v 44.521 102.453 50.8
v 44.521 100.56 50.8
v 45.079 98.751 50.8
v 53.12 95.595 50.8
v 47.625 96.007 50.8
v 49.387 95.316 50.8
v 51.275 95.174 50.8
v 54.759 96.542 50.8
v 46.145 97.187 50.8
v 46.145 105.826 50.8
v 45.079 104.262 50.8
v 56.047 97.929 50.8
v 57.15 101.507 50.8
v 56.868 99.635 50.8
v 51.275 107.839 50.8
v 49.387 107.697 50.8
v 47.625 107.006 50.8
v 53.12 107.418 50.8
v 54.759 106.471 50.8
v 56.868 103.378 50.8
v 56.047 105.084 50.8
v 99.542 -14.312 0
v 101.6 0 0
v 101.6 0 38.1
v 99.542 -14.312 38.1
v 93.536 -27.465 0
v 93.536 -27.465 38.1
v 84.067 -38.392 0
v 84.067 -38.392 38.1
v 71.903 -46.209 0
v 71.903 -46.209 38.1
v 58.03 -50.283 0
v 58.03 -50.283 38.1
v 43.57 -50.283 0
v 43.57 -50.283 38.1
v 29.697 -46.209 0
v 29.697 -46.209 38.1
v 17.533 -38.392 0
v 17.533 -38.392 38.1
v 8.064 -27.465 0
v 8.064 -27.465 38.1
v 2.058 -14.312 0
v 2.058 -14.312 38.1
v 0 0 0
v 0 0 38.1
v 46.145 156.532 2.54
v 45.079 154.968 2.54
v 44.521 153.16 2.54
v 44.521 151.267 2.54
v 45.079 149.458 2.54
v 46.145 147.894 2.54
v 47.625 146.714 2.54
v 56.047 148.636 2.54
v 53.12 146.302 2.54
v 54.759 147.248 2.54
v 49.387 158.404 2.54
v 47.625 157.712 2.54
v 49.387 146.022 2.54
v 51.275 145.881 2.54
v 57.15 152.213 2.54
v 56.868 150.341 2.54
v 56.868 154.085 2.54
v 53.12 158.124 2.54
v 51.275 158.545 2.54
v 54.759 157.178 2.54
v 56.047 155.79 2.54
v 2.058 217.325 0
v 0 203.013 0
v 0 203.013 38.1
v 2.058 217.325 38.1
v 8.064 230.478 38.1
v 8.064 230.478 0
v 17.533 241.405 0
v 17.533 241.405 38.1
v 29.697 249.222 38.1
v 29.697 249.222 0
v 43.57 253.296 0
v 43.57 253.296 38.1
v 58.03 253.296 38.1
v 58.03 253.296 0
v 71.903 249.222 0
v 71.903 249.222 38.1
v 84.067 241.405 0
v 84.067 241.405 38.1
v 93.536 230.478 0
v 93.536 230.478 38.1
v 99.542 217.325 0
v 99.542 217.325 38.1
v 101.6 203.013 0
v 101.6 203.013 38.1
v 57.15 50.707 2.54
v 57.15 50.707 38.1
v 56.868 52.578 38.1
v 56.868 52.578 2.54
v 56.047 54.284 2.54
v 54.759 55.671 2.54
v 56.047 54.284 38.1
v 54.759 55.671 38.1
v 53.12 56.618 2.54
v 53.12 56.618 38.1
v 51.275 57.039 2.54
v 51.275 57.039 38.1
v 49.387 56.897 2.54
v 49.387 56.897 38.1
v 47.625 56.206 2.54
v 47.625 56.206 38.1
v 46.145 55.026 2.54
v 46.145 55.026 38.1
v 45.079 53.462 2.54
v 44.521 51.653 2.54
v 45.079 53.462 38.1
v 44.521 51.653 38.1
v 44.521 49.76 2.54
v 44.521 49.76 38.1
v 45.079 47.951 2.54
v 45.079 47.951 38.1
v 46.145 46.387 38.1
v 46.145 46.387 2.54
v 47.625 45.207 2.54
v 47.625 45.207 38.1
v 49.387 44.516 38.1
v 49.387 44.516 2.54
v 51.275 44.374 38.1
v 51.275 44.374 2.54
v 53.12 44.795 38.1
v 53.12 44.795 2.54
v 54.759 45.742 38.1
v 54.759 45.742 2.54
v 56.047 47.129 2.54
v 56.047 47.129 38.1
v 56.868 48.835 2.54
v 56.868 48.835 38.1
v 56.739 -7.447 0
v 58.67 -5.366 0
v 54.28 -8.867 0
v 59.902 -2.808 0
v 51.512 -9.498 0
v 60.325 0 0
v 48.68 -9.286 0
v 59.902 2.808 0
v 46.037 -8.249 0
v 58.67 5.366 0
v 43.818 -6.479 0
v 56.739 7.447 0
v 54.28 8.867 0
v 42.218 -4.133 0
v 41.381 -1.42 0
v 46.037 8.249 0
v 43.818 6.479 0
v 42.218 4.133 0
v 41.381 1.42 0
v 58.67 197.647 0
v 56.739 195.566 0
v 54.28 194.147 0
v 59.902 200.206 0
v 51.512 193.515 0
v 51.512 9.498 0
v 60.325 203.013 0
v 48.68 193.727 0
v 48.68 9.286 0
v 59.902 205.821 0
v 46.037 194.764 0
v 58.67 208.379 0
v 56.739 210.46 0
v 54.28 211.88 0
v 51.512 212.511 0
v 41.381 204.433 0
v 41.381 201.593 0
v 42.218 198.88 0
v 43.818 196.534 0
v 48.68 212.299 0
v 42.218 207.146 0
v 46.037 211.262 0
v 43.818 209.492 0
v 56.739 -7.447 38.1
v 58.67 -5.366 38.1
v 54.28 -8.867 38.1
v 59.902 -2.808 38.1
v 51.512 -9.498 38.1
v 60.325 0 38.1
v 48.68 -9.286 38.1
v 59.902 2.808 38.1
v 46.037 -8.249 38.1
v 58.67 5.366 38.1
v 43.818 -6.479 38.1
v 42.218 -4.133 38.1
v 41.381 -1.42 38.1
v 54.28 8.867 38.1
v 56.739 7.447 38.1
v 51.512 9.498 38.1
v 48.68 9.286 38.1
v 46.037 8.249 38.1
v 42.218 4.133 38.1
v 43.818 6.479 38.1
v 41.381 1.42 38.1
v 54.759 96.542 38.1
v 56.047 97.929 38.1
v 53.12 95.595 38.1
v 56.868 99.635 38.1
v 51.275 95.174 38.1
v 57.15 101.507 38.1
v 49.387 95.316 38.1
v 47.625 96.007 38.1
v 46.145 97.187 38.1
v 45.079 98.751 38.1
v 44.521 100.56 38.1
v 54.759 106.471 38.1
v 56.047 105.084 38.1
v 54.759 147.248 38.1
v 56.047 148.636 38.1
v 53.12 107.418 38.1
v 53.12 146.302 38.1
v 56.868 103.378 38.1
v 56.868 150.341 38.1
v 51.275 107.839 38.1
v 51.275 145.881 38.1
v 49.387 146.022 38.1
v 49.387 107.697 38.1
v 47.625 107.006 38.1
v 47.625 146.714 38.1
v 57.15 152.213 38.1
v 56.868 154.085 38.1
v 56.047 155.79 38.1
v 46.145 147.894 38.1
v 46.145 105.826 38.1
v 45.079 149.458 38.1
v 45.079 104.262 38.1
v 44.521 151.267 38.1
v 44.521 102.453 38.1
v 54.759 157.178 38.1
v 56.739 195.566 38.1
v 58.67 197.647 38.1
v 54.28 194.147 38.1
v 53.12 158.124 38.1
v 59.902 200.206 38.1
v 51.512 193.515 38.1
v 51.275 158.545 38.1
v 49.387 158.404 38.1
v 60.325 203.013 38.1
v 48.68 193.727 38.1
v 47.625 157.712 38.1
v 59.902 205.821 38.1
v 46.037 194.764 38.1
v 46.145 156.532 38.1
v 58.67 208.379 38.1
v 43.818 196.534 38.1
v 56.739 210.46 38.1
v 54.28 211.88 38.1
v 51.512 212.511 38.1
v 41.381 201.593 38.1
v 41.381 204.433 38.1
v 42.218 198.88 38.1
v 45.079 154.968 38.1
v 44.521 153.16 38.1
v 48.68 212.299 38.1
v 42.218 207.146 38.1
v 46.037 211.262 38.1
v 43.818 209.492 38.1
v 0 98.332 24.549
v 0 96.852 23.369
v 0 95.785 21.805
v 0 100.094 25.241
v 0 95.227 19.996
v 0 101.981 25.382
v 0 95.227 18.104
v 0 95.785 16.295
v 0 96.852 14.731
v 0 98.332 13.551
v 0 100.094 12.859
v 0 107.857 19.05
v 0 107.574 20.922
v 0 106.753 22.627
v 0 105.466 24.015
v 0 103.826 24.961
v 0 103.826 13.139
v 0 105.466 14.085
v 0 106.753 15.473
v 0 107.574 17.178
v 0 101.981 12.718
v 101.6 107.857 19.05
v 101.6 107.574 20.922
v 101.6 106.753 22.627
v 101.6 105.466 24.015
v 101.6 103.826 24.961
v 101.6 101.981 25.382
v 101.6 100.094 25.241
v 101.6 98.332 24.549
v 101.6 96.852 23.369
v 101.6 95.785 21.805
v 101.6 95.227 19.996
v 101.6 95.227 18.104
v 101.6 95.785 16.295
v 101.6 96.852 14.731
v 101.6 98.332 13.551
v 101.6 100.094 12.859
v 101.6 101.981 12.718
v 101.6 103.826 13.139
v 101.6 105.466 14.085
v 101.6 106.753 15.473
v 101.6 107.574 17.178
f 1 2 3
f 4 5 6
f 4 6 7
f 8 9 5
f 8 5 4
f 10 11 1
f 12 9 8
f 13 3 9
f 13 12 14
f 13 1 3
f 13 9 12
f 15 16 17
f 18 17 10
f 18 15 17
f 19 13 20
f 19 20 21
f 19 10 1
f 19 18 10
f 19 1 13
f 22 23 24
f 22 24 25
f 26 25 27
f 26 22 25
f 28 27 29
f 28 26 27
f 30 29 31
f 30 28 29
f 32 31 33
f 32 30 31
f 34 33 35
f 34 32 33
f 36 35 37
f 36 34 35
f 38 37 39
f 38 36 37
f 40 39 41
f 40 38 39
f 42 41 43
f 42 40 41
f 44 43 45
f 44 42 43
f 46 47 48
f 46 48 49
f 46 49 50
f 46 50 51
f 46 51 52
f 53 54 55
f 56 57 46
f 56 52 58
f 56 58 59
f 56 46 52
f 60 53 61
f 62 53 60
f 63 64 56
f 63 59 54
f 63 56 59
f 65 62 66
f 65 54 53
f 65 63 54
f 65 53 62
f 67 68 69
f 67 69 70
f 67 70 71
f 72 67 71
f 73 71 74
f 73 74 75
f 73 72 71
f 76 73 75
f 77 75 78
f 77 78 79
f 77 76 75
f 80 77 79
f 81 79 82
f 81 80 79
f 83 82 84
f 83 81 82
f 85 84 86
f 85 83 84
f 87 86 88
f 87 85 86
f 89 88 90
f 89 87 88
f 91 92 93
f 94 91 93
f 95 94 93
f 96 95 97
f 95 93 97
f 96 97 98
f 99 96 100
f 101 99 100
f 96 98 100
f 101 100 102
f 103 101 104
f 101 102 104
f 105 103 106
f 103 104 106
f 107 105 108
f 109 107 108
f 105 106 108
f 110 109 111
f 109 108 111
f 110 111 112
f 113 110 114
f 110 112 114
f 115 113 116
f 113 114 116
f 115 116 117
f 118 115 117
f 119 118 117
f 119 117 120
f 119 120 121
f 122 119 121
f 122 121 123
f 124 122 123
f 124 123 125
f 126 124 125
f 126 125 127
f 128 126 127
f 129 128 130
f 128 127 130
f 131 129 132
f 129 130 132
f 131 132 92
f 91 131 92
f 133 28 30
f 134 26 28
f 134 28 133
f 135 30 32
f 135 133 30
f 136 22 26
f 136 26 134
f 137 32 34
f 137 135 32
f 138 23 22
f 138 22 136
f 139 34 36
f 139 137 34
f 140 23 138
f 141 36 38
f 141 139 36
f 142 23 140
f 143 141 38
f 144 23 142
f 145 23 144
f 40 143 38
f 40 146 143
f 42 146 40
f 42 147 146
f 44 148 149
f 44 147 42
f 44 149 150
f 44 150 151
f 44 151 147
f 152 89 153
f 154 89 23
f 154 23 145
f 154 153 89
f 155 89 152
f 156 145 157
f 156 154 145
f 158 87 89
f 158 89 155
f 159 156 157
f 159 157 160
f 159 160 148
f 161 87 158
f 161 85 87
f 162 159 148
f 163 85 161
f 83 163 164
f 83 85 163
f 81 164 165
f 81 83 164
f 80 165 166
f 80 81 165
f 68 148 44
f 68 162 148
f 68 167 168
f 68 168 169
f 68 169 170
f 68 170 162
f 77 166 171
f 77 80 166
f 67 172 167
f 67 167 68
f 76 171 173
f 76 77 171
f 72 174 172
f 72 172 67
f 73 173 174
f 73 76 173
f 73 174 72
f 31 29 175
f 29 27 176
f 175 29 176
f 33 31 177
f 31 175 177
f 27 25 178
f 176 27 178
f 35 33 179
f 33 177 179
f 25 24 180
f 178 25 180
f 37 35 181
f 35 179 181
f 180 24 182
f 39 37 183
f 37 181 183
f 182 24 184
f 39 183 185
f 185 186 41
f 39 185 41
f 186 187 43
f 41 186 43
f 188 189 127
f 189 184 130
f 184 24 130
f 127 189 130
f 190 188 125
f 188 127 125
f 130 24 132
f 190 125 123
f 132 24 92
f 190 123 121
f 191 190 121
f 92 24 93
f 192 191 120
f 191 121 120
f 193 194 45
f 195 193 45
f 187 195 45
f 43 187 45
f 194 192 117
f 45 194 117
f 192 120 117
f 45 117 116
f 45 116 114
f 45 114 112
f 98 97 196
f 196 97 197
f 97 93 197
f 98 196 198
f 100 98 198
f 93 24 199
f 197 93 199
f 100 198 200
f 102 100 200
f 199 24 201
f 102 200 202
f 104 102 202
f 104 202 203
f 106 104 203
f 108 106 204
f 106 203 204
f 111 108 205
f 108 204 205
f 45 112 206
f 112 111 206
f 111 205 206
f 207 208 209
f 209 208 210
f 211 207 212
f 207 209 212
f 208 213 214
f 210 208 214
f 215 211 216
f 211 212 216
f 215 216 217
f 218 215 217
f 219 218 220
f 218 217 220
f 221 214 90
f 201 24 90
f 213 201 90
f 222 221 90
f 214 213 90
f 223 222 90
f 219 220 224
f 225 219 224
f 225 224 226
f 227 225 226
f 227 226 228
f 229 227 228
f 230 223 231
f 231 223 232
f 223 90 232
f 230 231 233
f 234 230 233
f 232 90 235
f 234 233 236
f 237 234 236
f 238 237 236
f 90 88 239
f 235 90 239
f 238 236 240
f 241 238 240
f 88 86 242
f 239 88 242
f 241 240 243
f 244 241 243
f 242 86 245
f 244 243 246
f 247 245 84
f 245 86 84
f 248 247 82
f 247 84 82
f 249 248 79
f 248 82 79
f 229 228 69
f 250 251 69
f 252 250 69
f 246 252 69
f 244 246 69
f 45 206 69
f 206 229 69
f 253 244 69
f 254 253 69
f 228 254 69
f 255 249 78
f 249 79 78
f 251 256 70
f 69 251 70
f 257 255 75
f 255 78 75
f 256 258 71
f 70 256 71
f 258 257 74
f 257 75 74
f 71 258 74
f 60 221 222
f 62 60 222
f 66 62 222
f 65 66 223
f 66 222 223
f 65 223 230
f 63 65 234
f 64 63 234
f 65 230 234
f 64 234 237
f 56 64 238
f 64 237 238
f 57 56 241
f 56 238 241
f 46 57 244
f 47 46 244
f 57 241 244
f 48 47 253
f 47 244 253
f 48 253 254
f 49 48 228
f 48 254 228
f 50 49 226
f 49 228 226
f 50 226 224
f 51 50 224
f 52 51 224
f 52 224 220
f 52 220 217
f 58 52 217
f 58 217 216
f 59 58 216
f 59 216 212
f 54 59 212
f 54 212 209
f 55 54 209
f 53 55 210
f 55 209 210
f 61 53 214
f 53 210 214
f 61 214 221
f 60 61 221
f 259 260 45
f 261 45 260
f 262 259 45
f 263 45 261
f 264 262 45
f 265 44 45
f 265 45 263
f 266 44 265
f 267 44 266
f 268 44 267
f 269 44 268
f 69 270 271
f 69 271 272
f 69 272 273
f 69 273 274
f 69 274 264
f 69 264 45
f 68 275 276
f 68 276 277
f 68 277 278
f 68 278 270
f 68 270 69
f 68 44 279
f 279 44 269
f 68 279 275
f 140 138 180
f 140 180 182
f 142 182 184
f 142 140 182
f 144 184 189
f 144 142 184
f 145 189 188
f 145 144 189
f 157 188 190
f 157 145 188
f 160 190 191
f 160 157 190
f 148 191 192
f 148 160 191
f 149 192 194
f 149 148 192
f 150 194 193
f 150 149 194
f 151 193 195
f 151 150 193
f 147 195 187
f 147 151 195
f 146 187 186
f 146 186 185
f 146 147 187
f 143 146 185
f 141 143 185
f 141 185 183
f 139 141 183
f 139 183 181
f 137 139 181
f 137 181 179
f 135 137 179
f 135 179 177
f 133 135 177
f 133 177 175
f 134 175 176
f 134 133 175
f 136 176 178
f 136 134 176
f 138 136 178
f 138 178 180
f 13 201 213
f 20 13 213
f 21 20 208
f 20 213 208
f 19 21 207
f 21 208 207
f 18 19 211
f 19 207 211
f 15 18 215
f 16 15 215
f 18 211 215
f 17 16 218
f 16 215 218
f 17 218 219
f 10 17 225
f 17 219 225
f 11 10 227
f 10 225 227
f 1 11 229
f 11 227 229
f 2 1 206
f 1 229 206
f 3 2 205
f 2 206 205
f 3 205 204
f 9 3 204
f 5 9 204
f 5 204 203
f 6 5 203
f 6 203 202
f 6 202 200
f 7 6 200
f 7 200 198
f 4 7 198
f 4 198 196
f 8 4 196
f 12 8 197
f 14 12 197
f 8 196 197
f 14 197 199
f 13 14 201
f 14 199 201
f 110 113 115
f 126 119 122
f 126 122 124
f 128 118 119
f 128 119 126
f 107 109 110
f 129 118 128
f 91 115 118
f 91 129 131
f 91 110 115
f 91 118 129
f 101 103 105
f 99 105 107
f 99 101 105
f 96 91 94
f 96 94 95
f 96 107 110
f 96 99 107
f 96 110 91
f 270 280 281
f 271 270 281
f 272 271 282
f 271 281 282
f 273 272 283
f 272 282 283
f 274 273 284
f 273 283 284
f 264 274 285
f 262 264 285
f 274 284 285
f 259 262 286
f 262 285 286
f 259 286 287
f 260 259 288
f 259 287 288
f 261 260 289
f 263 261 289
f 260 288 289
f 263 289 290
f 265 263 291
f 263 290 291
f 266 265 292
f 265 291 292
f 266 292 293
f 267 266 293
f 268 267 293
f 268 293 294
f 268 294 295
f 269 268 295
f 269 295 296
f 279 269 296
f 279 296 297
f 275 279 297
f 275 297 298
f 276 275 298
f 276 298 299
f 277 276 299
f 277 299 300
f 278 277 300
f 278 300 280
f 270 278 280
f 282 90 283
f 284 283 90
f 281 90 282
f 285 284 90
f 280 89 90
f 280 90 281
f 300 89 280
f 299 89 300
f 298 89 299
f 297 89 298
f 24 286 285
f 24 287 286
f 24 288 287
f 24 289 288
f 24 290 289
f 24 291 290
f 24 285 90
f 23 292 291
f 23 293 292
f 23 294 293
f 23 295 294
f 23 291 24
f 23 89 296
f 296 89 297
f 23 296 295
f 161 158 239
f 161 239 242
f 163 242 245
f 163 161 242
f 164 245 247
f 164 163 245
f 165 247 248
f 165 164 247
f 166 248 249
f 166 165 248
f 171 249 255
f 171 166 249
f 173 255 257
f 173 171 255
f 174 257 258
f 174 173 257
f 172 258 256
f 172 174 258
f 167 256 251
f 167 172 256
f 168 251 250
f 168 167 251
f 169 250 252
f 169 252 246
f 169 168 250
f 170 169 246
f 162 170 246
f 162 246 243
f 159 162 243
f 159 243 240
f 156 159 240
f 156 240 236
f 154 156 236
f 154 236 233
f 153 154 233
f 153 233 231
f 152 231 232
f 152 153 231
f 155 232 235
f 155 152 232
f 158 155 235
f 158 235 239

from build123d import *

# Parameters (mm, degrees)
BOSS_EXTRUDE1_DEPTH     = 38.1
SKETCH2_R               = 6.35
CUT_EXTRUDE1_DEPTH      = 277.034883433
ADVANCEDHOLE3_OUTLINE_R = 9.525
ADVANCEDHOLE3_DEPTH     = 38.1
SKETCH21_R              = 6.35
CUT_EXTRUDE2_DEPTH      = 35.56
SKETCH23_R              = 6.35
BOSS_EXTRUDE2_DEPTH     = 12.7


# Read off the part's stored shape, not the designer's step: AdvancedHole3
with BuildPart() as part:
    # Sketch1 → Boss-Extrude1 (new body)
    with BuildSketch(Plane.XY):
        with BuildLine():
            Line((0, 0), (0, 203.013094366))
            ThreePointArc((0, 203.013094366), (50.8, 253.813094366), (101.6, 203.013094366))
            Line((101.6, 203.013094366), (101.6, 0))
            ThreePointArc((101.6, 0), (50.8, -50.8), (0, 0))
        make_face()
    extrude(amount=BOSS_EXTRUDE1_DEPTH)

    # Sketch2 → Cut-Extrude1 (cut, through all)
    with BuildSketch(Plane(origin=(101.6, 0, 0), x_dir=(0, 0, -1), z_dir=(1, 0, 0))):
        with Locations(Location((-19.05, 101.506547183, 0), (0, 0, 90))):
            Circle(SKETCH2_R)
    extrude(amount=-CUT_EXTRUDE1_DEPTH, mode=Mode.SUBTRACT)

    # AdvancedHole3 outline → AdvancedHole3 (cut)
    with BuildSketch(Plane.XY):
        with Locations((50.8, 203.013094366)):
            Circle(ADVANCEDHOLE3_OUTLINE_R)
        with Locations((50.8, 0)):
            Circle(ADVANCEDHOLE3_OUTLINE_R)
    extrude(amount=ADVANCEDHOLE3_DEPTH, mode=Mode.SUBTRACT)

    # Sketch21 → Cut-Extrude2 (cut)
    with BuildSketch(Plane.XY.offset(38.1)):
        with Locations((50.8, 50.706547183)):
            Circle(SKETCH21_R)
        with Locations((50.8, 152.213094366)):
            Circle(SKETCH21_R)
    extrude(amount=-CUT_EXTRUDE2_DEPTH, mode=Mode.SUBTRACT)

    # Sketch23 → Boss-Extrude2 (add)
    with BuildSketch(Plane.XY.offset(38.1)):
        with Locations((50.8, 101.506547183)):
            Circle(SKETCH23_R)
    extrude(amount=BOSS_EXTRUDE2_DEPTH)


solid = part.part
